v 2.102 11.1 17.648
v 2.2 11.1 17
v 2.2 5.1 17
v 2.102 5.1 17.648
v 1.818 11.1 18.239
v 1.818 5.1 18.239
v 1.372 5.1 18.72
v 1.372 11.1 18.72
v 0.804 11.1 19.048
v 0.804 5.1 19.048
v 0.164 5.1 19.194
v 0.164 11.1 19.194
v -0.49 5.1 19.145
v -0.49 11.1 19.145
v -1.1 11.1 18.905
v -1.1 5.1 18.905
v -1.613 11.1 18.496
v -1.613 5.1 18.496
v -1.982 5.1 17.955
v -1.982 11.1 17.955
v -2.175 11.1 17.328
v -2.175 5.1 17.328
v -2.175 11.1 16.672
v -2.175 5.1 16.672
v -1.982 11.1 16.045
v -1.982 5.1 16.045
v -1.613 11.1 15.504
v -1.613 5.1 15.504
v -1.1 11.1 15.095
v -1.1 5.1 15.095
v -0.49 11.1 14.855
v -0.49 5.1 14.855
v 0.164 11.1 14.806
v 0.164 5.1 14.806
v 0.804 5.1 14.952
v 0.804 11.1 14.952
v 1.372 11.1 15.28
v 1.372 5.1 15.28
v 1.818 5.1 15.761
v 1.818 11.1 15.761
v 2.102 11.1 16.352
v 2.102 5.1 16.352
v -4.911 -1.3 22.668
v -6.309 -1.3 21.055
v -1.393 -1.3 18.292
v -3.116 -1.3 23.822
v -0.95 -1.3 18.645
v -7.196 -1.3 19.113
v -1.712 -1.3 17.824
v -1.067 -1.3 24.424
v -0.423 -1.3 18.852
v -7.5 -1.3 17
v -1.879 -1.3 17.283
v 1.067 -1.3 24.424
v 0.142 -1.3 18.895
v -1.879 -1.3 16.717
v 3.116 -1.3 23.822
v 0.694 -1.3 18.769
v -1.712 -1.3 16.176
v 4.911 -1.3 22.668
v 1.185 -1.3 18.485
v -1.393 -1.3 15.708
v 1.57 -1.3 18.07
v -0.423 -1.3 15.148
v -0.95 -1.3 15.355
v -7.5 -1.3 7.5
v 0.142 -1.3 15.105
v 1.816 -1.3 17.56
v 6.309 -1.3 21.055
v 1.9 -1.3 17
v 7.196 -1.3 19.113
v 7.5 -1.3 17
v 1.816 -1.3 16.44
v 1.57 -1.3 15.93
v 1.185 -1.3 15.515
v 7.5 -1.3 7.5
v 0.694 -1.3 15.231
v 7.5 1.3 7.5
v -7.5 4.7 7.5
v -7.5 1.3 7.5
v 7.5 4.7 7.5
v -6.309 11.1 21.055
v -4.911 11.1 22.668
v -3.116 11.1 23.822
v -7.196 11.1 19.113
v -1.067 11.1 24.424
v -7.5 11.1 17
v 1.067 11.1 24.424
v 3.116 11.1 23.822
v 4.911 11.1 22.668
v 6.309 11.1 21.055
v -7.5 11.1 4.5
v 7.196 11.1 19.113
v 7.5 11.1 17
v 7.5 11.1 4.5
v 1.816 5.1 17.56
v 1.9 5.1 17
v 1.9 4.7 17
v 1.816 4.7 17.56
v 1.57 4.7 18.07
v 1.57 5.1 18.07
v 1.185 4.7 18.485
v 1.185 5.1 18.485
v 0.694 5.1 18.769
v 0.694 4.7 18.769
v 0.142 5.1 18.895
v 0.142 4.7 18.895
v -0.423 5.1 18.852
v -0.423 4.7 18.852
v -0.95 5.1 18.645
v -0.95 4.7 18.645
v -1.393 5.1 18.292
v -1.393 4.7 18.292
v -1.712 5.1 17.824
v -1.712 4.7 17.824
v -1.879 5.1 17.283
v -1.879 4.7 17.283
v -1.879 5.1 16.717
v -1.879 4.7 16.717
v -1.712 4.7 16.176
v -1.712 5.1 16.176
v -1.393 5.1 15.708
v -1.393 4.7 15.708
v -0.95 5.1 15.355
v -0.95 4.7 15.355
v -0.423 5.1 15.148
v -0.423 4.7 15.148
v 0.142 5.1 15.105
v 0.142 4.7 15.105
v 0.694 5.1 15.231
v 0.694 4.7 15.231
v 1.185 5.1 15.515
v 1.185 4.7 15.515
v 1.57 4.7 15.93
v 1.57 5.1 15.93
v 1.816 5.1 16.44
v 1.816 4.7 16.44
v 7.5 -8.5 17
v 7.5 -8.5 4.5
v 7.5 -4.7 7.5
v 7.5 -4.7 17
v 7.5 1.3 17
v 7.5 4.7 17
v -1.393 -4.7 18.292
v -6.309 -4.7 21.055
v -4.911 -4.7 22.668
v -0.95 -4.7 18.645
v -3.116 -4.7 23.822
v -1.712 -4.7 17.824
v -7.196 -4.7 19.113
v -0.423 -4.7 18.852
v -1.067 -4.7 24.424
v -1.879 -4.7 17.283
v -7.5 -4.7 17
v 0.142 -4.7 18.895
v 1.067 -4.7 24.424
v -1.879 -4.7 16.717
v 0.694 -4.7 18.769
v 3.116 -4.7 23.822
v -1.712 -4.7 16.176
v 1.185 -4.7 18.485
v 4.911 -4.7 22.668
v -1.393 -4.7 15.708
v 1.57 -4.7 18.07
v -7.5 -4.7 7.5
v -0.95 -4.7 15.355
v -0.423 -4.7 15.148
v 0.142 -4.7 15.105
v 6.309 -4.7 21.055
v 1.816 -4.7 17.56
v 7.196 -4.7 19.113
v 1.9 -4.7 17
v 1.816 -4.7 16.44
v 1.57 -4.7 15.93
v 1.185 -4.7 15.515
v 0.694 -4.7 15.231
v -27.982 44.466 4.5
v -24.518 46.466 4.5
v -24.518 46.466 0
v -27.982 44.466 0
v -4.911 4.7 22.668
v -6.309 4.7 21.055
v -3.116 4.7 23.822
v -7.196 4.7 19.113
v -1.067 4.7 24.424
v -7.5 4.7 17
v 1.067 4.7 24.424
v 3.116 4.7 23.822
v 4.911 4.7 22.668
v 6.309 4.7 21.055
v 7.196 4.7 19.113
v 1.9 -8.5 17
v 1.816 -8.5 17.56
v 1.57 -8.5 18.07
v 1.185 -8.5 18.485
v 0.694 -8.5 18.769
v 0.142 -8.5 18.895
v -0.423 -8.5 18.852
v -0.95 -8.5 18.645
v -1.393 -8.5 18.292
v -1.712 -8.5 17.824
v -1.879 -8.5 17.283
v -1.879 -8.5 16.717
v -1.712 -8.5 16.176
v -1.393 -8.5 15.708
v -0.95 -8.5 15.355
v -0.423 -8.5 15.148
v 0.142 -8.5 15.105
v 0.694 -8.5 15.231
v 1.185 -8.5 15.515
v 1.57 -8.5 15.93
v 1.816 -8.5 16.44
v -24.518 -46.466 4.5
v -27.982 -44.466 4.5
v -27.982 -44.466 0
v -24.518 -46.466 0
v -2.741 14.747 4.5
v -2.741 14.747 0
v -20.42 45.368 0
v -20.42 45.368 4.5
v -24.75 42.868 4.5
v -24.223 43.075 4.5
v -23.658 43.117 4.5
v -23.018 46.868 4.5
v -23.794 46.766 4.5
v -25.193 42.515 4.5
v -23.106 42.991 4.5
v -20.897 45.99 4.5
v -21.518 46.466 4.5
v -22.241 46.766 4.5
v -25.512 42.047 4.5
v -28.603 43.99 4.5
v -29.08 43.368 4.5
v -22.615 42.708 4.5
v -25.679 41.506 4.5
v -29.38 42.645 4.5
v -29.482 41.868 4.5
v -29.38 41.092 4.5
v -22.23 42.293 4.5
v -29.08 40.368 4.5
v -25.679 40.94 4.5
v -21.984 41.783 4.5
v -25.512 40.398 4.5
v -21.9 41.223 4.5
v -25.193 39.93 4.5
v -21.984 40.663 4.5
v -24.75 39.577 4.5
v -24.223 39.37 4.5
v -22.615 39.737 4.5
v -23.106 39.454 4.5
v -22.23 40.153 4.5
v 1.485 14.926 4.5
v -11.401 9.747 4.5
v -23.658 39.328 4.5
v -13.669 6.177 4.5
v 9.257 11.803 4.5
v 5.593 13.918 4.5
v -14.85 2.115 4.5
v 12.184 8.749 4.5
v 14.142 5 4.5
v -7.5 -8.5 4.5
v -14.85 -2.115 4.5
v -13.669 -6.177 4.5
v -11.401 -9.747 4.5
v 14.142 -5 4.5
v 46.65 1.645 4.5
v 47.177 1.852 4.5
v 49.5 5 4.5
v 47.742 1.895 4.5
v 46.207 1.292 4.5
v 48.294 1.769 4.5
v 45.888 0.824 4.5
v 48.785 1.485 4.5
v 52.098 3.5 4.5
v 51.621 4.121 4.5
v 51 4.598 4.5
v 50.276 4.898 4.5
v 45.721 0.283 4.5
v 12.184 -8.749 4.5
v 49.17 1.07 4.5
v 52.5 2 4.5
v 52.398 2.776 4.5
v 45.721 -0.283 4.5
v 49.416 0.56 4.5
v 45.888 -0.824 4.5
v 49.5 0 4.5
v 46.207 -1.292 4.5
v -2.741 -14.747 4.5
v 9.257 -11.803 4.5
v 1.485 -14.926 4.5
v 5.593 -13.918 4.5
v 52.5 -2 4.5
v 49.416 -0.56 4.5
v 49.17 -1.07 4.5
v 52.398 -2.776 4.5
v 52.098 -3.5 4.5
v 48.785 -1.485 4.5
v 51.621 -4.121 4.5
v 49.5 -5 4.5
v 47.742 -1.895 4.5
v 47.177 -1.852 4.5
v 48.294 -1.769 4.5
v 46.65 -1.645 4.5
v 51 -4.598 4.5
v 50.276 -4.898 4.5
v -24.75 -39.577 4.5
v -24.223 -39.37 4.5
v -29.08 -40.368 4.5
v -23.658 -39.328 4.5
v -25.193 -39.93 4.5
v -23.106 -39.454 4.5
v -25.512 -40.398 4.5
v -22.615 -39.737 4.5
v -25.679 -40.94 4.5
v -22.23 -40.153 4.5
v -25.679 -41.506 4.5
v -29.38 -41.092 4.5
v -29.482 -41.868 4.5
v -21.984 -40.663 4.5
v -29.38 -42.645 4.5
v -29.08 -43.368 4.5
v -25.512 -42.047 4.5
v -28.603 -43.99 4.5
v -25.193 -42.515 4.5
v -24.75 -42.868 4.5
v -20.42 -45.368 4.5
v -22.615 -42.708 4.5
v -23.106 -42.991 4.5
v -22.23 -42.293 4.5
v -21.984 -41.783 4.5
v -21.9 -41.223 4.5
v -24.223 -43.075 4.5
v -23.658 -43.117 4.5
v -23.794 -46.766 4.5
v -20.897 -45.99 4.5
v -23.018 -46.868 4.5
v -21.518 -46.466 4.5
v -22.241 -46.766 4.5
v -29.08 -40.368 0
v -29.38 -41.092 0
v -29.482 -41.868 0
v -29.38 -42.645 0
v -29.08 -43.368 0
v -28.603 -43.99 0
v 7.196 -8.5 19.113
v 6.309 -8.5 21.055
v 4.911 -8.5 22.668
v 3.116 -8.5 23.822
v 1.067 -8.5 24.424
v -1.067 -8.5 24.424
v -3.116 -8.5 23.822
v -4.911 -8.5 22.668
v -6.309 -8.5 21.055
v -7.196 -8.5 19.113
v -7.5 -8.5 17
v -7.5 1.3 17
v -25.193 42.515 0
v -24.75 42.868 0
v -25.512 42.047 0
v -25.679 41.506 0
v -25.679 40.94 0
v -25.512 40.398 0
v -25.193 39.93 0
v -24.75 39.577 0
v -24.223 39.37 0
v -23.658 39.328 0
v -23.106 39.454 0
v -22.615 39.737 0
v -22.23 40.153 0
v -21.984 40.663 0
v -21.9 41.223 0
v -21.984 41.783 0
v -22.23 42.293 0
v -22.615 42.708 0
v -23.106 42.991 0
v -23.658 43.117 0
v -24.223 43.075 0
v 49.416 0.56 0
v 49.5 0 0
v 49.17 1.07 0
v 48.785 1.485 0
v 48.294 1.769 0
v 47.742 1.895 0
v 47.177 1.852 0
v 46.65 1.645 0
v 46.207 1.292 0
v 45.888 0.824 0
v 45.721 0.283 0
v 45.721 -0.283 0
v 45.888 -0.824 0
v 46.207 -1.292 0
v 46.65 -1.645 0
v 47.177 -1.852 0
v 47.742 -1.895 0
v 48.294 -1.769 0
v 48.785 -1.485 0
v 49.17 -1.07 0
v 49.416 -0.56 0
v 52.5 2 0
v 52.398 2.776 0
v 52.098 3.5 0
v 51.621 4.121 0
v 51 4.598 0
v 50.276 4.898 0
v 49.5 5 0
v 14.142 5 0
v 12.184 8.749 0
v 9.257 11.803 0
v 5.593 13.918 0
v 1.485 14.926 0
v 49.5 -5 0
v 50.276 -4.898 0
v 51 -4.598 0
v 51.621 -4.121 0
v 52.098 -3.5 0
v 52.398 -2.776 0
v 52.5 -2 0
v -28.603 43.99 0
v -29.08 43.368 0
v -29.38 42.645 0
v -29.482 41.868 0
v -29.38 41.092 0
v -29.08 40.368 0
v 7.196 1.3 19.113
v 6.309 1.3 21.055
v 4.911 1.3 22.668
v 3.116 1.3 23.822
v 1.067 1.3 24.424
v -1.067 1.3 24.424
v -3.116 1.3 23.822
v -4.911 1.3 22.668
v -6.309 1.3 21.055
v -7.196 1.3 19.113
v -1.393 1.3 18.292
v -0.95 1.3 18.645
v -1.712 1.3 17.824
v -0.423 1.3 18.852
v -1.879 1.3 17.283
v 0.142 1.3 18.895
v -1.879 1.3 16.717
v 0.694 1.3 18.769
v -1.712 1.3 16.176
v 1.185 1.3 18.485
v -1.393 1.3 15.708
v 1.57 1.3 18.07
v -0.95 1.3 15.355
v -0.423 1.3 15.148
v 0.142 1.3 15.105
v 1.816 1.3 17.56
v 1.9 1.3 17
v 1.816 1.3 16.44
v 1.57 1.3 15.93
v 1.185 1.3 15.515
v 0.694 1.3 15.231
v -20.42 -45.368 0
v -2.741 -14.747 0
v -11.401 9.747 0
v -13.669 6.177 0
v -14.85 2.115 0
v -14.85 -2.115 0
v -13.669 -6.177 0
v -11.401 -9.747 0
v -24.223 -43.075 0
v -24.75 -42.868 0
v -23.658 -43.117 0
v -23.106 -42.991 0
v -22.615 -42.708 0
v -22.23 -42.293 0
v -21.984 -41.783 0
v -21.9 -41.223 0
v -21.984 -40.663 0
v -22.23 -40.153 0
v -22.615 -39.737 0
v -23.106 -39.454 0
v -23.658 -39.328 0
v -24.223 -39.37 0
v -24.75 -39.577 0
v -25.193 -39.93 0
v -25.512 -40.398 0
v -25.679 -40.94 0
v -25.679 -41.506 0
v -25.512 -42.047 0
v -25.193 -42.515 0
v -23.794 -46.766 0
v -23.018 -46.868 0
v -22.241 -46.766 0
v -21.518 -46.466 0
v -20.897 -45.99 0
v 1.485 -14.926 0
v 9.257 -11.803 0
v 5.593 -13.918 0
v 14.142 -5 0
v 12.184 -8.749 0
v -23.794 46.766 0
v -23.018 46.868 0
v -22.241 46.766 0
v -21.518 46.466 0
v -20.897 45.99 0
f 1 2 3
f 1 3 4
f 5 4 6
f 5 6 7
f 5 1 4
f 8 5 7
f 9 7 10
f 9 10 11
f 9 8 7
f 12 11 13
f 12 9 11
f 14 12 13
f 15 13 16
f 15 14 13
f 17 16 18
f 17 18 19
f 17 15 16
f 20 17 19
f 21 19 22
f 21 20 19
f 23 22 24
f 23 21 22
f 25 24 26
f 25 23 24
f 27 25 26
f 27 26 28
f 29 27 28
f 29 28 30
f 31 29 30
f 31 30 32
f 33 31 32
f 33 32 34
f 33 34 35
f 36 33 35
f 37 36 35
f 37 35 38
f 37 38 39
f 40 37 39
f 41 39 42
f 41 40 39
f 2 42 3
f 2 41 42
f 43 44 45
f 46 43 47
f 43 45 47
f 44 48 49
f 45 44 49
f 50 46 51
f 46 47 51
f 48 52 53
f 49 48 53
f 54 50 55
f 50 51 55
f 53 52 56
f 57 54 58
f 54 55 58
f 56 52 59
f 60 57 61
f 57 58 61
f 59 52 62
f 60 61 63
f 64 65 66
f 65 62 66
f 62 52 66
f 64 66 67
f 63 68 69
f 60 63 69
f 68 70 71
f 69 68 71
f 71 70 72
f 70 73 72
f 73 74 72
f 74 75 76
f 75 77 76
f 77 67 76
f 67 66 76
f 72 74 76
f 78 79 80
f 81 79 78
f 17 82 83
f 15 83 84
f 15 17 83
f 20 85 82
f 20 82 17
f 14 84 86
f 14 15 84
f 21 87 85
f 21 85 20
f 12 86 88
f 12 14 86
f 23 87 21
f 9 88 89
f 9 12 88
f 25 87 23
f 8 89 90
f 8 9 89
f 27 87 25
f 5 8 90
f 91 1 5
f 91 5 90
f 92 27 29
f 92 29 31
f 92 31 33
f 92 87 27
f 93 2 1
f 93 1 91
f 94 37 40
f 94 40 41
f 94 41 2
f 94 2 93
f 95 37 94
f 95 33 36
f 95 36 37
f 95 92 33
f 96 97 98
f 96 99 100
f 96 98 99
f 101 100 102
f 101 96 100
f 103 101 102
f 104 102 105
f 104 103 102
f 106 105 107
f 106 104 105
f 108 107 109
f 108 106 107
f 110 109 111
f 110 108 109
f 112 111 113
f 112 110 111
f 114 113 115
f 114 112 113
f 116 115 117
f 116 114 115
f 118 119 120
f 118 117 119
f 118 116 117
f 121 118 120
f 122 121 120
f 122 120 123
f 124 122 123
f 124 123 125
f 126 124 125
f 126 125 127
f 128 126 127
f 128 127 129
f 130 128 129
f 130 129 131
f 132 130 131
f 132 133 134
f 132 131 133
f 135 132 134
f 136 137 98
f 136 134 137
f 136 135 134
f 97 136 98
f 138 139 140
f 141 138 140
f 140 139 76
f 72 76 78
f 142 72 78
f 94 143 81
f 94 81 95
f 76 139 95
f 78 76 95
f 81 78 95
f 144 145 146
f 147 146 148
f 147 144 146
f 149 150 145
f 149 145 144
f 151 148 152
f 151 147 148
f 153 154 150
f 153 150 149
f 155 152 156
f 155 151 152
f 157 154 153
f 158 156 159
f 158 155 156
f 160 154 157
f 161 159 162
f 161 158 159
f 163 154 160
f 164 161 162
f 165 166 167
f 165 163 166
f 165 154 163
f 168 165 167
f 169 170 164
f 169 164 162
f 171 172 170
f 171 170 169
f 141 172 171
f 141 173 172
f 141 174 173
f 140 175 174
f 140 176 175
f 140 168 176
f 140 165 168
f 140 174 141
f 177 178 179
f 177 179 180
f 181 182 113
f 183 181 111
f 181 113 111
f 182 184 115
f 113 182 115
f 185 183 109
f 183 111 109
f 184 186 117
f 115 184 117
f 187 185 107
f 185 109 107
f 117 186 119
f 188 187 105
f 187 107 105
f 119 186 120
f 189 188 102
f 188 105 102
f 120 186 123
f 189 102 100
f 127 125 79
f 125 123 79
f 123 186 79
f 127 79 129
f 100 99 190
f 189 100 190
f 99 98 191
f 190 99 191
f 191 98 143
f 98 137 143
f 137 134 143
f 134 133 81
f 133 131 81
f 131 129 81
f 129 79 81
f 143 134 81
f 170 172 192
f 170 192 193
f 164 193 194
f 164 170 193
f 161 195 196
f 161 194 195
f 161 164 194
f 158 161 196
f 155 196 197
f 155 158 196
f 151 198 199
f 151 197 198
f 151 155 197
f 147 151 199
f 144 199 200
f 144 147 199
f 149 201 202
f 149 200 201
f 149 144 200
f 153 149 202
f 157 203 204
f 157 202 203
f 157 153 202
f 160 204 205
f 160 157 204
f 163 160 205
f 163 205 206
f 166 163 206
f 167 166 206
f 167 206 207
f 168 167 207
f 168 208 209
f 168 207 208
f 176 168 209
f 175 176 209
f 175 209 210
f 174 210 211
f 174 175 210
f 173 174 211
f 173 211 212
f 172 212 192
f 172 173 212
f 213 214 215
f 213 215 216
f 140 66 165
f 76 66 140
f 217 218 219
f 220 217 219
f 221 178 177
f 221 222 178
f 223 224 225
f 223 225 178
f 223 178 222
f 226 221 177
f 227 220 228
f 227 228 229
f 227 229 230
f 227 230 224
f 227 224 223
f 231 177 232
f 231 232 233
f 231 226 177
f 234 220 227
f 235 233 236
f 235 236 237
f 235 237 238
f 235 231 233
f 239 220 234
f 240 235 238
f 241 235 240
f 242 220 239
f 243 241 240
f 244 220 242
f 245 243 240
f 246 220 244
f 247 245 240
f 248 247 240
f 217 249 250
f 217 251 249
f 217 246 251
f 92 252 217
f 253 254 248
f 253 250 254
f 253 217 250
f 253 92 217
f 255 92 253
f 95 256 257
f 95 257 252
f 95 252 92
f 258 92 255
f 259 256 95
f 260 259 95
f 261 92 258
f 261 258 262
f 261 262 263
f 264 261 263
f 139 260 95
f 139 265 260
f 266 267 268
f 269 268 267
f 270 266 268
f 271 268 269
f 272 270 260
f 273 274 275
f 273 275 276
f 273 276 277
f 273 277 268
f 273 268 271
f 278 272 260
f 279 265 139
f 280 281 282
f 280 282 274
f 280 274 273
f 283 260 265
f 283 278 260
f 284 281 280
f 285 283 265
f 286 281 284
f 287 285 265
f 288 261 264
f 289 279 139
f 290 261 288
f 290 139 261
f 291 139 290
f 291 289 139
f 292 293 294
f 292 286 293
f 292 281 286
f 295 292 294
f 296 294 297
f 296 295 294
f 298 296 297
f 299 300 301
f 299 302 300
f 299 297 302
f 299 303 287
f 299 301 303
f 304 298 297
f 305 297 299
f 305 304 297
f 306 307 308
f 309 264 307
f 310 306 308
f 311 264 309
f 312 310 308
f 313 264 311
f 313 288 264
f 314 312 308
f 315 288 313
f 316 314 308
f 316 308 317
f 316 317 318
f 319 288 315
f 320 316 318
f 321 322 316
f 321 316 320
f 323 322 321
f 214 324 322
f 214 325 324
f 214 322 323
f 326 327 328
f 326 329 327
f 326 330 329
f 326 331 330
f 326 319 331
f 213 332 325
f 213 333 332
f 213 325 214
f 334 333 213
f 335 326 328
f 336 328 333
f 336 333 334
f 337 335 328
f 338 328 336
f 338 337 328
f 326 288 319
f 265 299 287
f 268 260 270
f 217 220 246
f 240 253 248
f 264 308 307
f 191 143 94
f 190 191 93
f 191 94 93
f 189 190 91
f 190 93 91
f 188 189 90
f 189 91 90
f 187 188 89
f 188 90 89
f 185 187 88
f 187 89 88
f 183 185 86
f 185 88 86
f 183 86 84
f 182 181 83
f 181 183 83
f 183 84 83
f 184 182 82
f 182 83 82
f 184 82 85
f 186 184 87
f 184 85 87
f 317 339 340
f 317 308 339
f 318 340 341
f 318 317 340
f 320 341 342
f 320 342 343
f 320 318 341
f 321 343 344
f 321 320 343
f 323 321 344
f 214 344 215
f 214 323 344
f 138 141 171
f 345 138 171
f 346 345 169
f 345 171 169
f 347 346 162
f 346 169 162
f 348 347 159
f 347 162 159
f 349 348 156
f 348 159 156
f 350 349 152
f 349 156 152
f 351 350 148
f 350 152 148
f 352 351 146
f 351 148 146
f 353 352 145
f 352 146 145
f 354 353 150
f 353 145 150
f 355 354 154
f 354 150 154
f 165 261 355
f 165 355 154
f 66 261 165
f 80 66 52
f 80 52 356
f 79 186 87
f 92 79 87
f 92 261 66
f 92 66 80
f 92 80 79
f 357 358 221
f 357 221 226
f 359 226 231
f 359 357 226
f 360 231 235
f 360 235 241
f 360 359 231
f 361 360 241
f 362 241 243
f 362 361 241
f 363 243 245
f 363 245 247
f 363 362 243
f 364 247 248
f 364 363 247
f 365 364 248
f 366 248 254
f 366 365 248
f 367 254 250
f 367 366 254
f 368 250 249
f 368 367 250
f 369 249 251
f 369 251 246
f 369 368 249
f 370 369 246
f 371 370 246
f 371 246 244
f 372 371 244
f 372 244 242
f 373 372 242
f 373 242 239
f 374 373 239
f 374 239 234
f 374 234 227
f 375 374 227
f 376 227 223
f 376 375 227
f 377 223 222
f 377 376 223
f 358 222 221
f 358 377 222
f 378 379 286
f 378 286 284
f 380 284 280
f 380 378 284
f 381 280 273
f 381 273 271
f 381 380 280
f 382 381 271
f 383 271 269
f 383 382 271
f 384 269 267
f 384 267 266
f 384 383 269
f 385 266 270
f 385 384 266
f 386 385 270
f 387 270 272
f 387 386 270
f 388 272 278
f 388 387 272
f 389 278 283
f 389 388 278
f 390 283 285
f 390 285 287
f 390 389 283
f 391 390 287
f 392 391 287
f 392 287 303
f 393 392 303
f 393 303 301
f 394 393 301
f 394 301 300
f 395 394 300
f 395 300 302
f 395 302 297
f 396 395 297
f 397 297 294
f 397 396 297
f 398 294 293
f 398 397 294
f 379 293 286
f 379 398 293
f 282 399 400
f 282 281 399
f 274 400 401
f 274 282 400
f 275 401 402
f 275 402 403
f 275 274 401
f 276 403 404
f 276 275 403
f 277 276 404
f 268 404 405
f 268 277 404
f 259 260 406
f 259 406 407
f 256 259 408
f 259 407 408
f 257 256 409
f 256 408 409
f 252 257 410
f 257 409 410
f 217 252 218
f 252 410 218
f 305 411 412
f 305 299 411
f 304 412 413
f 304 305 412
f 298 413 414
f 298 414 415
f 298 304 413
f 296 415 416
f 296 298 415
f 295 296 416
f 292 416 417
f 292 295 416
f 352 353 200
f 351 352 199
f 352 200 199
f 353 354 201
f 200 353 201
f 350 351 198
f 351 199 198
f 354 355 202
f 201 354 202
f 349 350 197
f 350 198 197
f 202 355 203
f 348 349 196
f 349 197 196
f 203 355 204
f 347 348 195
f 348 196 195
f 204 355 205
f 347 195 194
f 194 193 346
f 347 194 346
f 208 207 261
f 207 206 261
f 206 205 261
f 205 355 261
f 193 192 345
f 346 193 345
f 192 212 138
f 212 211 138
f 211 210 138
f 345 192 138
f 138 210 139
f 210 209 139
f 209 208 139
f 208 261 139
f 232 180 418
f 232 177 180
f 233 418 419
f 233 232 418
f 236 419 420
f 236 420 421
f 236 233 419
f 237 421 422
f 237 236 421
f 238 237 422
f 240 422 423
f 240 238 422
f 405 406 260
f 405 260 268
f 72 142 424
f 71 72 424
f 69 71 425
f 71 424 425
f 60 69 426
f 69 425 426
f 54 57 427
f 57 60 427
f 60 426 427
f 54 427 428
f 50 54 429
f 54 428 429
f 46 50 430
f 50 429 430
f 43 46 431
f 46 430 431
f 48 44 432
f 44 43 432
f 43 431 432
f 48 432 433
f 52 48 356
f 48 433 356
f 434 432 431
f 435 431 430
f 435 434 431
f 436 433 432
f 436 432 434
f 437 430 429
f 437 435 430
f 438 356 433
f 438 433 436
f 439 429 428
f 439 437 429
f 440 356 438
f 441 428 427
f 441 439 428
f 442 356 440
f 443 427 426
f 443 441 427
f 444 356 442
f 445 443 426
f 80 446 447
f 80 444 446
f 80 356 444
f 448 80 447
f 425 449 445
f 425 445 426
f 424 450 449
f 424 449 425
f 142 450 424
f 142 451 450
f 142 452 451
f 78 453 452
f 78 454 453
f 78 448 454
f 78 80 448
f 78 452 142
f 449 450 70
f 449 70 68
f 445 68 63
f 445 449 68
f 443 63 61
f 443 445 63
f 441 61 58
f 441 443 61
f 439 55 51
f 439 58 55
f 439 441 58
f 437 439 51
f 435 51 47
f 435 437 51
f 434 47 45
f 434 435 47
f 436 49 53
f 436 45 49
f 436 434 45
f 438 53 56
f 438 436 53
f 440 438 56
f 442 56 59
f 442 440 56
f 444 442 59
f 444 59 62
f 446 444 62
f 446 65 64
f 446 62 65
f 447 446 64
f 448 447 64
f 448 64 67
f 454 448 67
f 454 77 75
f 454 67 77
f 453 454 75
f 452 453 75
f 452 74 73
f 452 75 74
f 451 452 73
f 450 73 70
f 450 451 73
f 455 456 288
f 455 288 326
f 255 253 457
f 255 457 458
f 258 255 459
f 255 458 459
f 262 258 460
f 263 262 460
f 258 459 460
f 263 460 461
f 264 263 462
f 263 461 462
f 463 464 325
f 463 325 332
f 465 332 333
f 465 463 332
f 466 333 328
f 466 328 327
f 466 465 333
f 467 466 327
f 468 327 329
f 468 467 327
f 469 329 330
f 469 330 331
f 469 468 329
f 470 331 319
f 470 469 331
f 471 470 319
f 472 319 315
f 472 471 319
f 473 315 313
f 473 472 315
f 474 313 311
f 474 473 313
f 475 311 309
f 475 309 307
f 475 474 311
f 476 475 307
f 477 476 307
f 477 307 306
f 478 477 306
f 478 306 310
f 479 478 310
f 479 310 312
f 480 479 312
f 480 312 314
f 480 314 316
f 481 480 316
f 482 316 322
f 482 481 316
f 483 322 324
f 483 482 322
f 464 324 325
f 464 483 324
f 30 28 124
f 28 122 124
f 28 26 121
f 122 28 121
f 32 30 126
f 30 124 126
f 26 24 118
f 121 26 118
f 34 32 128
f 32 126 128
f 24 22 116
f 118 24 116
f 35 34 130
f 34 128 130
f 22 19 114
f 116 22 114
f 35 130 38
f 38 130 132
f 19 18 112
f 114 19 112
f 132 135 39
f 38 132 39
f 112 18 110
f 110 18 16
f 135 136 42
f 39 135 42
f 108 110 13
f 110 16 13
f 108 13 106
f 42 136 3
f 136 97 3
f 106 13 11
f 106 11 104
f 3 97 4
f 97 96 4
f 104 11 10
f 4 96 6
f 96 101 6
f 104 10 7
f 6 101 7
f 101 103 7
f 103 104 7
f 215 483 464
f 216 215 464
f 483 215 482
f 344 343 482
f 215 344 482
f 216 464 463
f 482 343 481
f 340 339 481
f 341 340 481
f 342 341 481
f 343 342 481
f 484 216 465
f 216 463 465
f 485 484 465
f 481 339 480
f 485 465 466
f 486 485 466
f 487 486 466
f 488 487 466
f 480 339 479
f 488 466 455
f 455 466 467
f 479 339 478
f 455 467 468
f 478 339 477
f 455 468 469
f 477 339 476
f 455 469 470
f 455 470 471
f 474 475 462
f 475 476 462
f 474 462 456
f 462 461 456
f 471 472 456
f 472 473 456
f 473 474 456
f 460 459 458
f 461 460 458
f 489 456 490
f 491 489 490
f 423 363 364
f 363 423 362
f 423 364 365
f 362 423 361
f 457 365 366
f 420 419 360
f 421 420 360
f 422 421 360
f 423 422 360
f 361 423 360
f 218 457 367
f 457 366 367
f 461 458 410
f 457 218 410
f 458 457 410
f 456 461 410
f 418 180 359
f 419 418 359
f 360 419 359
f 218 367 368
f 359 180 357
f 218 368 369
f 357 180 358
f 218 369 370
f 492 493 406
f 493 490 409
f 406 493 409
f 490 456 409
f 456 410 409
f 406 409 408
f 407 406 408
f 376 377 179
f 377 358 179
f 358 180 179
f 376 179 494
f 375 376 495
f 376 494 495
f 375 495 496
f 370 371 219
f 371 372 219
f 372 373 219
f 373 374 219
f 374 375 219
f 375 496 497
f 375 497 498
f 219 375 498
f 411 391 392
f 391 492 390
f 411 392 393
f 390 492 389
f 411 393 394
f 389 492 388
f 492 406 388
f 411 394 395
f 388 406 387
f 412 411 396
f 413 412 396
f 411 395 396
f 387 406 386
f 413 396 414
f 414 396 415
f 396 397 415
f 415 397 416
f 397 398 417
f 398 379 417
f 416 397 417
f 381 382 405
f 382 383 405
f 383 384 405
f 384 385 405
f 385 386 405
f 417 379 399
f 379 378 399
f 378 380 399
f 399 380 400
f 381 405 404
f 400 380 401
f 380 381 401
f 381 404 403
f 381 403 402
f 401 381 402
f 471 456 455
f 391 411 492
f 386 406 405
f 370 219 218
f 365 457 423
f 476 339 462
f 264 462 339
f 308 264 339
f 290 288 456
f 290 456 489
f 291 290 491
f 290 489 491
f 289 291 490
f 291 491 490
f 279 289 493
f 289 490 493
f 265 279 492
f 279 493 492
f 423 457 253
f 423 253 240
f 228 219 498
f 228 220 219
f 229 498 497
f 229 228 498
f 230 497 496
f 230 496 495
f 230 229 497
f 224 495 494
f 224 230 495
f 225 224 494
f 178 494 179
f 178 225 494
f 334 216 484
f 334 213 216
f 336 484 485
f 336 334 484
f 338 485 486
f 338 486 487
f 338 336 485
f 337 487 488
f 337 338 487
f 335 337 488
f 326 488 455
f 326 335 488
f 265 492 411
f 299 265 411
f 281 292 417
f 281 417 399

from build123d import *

# Parameters (mm, degrees)
CYLINDER009_R             = 1.9
CYLINDER009_DEPTH         = 4.5
BOX010_W                  = 45
BOX010_H                  = 10
BOX010_DEPTH              = 4.5
FILLET_R                  = 3
ARRAY002_COUNT            = 3
BOX003_W                  = 15
BOX003_H                  = 3.4
BOX003_DEPTH              = 17
ARRAY_Y_COUNT             = 2
ARRAY_Y_PITCH             = 6
CYLINDER002_R             = 2.2
CYLINDER002_DEPTH         = 6
CYLINDER001_R             = 1.9
CYLINDER001_DEPTH         = 15
FUSION001_PLACEMENT_ANGLE = 90
CYLINDER_R                = 7.5
CYLINDER_DEPTH            = 19.6
BOX002_W                  = 15
BOX002_H                  = 19.6
BOX002_DEPTH              = 12.5
CYLINDER007_R             = 15
CYLINDER007_DEPTH         = 4.5


with BuildPart() as bolt_hole002:
    # Cylinder009 → Cylinder009 (new body)
    with BuildSketch(Plane(origin=(47.6, 0, 0), x_dir=(1, 0, 0), z_dir=(0, 0, 1))):
        Circle(CYLINDER009_R)
    extrude(amount=CYLINDER009_DEPTH)


with BuildPart() as stand_stick_array:
    # Box010 → Box010 (new body)
    with BuildSketch(Plane(origin=(7.5, -5, 0), x_dir=(1, 0, 0), z_dir=(0, 0, 1))):
        with Locations((22.5, 5)):
            Rectangle(BOX010_W, BOX010_H)
    extrude(amount=BOX010_DEPTH)

    # Fillet
    fillet_edges = [stand_stick_array.edges().sort_by_distance(p)[0] for p in [
        (52.5, -5, 2.25),
        (52.5, 5, 2.25),
    ]]
    fillet(fillet_edges, radius=FILLET_R)

    # Cut006: cut bolt hole002
    add(bolt_hole002.part, mode=Mode.SUBTRACT)

    # Array002: stand stick array ×3 about axis
    array002_axis = Axis((0, 0, 0), (0, 0, 1))


with BuildPart() as stand_stick_array_1:
    add(stand_stick_array.part)
    for i in range(1, ARRAY002_COUNT):
        add(stand_stick_array.part.rotate(array002_axis, i * 360 / ARRAY002_COUNT))


with BuildPart() as side_3_extract_cube_array:
    # Box003 → Box003 (new body)
    with BuildSketch(Plane(origin=(-7.5, -7.7, 3), x_dir=(1, 0, 0), z_dir=(0, 0, 1))):
        with Locations((7.5, 1.7)):
            Rectangle(BOX003_W, BOX003_H)
    extrude(amount=BOX003_DEPTH)

    # Array Y: side 3 extract cube array ×2


with BuildPart() as side_3_extract_cube_array_1:
    add(side_3_extract_cube_array.part)
    with Locations(*[(0, i * ARRAY_Y_PITCH, 0) for i in range(1, ARRAY_Y_COUNT)]):
        add(side_3_extract_cube_array.part)


with BuildPart() as side_3_extract_cube_array_2:
    # Array placement: moved
    add(side_3_extract_cube_array_1.part.moved(Location((0, 3, 0))))


with BuildPart() as insert_hole:
    # Cylinder002 → Cylinder002 (new body)
    with BuildSketch(Plane.XY):
        Circle(CYLINDER002_R)
    extrude(amount=CYLINDER002_DEPTH)


with BuildPart() as side_3_extract_fusion:
    # Cylinder001 → Cylinder001 (new body)
    with BuildSketch(Plane.XY.offset(6)):
        Circle(CYLINDER001_R)
    extrude(amount=CYLINDER001_DEPTH)

    # Fusion001: union insert hole
    add(insert_hole.part)


with BuildPart() as side_3_extract_fusion_1:
    # Fusion001 placement: moved
    add(side_3_extract_fusion.part.moved(Location((0, 11.1, 12.5))).rotate(Axis((0, 11.1, 12.5), (1, 0, 0)), FUSION001_PLACEMENT_ANGLE))

    # Fusion002: union side 3 extract cube array
    add(side_3_extract_cube_array_2.part)


with BuildPart() as outer_cylinder:
    # Cylinder → Cylinder (new body)
    with BuildSketch(Plane(origin=(0, 11.1, 12.5), x_dir=(1, 0, 0), z_dir=(0, -1, 0))):
        Circle(CYLINDER_R)
    extrude(amount=CYLINDER_DEPTH)


with BuildPart() as side_3_cut_clone002:
    # Box002 → Box002 (new body)
    with BuildSketch(Plane(origin=(-7.5, -8.5, 0), x_dir=(1, 0, 0), z_dir=(0, 0, 1))):
        with Locations((7.5, 9.8)):
            Rectangle(BOX002_W, BOX002_H)
    extrude(amount=BOX002_DEPTH)

    # Fusion: union outer cylinder
    add(outer_cylinder.part)

    # Cut: cut side 3 extract fusion
    add(side_3_extract_fusion_1.part, mode=Mode.SUBTRACT)


with BuildPart() as side_3_cut_clone002_1:
    # Body005 placement: moved
    add(side_3_cut_clone002.part.moved(Location((0, 0, 4.5))))


with BuildPart() as stand_fusion:
    # Cylinder007 → Cylinder007 (new body)
    with BuildSketch(Plane.XY):
        Circle(CYLINDER007_R)
    extrude(amount=CYLINDER007_DEPTH)

    # Fusion007: union stand stick array, side 3 cut clone002
    add(stand_stick_array_1.part)
    add(side_3_cut_clone002_1.part)


solid = stand_fusion.part
